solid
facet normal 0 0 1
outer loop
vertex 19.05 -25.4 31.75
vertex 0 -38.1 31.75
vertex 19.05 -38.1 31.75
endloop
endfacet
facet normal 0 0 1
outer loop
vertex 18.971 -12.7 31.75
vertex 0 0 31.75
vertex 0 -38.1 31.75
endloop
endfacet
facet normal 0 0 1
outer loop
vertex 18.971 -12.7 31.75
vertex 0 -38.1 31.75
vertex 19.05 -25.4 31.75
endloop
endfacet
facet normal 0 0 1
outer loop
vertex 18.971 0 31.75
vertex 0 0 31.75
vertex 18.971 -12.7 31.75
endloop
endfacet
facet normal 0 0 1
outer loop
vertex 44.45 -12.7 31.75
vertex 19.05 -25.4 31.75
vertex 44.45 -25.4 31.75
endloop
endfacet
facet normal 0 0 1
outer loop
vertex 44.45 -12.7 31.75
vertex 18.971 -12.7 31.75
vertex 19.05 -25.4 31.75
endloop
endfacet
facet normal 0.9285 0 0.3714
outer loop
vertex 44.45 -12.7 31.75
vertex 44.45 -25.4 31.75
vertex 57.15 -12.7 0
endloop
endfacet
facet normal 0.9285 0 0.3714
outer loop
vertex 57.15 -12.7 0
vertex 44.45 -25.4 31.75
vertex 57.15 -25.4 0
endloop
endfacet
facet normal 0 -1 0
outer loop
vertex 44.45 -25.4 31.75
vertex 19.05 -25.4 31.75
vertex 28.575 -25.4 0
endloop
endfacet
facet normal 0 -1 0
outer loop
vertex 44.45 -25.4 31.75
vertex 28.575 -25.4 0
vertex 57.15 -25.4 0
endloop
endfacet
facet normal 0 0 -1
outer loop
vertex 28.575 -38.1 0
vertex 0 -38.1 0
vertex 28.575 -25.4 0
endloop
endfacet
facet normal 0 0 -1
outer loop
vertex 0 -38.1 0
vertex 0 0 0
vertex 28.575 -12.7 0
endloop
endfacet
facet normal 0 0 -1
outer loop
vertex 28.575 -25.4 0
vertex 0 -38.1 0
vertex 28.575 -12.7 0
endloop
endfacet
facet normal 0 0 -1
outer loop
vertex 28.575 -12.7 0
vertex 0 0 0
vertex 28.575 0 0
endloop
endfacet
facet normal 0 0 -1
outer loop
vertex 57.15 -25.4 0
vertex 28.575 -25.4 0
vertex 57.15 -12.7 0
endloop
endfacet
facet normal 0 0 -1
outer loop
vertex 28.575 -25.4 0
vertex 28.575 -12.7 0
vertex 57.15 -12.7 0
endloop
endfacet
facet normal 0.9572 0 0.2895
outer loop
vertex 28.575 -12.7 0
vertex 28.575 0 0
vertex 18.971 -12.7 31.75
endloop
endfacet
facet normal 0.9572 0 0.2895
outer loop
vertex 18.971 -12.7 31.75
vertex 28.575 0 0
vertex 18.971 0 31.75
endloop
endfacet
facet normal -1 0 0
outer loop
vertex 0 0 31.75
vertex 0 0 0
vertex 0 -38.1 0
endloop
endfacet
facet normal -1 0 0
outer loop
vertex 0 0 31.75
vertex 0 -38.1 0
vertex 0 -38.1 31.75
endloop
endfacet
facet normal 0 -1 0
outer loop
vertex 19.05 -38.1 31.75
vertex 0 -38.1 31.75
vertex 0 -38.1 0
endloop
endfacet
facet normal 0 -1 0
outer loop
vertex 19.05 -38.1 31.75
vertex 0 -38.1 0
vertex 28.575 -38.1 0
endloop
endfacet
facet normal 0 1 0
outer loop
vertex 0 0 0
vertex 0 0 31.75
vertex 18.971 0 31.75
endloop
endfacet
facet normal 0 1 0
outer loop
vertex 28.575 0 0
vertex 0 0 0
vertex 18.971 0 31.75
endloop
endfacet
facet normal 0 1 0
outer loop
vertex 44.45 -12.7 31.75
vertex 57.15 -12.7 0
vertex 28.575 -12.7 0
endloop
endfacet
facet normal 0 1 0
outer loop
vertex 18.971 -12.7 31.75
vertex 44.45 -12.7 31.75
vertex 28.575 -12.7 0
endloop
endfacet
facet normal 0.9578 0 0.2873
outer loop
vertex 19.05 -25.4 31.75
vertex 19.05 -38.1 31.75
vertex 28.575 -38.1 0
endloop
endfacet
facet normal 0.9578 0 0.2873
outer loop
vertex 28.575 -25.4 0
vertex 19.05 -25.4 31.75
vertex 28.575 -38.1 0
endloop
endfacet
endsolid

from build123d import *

# Parameters (mm, degrees)
F0_W     = 57.15
F0_H     = 31.75
F1_DEPTH = 38.1
F3_DEPTH = 12.7
F5_DEPTH = 12.7
F7_DEPTH = 25.401


with BuildPart() as f1:
    # F0 (on Front) → F1 (new body)
    with BuildSketch(Plane.XZ):
        with Locations((28.575, 15.875)):
            Rectangle(F0_W, F0_H)
    extrude(amount=F1_DEPTH)

    # F2 (on face) → F3 (cut)
    with BuildSketch(Plane.XZ.offset(38.1)):
        Polygon((57.15, 31.75), (19.05, 31.75), (28.575, 0), (57.15, 0), align=None)
    extrude(amount=-F3_DEPTH, mode=Mode.SUBTRACT)

    # F4 (on face) → F5 (cut)
    with BuildSketch(Plane(origin=(0, 0, 0), x_dir=(-1, 0, 0), z_dir=(0, 1, 0))):
        Polygon((-28.575, 0), (-18.9710725099, 31.75), (-57.15, 31.75), (-57.15, 0), align=None)
    extrude(amount=-F5_DEPTH, mode=Mode.SUBTRACT)

    # F6 (on face) → F7 (cut, through all)
    with BuildSketch(Plane.XZ.offset(25.4)):
        Polygon((44.45, 31.75), (57.15, 0), (57.15, 31.75), align=None)
    extrude(amount=-F7_DEPTH, mode=Mode.SUBTRACT)


solid = f1.part
